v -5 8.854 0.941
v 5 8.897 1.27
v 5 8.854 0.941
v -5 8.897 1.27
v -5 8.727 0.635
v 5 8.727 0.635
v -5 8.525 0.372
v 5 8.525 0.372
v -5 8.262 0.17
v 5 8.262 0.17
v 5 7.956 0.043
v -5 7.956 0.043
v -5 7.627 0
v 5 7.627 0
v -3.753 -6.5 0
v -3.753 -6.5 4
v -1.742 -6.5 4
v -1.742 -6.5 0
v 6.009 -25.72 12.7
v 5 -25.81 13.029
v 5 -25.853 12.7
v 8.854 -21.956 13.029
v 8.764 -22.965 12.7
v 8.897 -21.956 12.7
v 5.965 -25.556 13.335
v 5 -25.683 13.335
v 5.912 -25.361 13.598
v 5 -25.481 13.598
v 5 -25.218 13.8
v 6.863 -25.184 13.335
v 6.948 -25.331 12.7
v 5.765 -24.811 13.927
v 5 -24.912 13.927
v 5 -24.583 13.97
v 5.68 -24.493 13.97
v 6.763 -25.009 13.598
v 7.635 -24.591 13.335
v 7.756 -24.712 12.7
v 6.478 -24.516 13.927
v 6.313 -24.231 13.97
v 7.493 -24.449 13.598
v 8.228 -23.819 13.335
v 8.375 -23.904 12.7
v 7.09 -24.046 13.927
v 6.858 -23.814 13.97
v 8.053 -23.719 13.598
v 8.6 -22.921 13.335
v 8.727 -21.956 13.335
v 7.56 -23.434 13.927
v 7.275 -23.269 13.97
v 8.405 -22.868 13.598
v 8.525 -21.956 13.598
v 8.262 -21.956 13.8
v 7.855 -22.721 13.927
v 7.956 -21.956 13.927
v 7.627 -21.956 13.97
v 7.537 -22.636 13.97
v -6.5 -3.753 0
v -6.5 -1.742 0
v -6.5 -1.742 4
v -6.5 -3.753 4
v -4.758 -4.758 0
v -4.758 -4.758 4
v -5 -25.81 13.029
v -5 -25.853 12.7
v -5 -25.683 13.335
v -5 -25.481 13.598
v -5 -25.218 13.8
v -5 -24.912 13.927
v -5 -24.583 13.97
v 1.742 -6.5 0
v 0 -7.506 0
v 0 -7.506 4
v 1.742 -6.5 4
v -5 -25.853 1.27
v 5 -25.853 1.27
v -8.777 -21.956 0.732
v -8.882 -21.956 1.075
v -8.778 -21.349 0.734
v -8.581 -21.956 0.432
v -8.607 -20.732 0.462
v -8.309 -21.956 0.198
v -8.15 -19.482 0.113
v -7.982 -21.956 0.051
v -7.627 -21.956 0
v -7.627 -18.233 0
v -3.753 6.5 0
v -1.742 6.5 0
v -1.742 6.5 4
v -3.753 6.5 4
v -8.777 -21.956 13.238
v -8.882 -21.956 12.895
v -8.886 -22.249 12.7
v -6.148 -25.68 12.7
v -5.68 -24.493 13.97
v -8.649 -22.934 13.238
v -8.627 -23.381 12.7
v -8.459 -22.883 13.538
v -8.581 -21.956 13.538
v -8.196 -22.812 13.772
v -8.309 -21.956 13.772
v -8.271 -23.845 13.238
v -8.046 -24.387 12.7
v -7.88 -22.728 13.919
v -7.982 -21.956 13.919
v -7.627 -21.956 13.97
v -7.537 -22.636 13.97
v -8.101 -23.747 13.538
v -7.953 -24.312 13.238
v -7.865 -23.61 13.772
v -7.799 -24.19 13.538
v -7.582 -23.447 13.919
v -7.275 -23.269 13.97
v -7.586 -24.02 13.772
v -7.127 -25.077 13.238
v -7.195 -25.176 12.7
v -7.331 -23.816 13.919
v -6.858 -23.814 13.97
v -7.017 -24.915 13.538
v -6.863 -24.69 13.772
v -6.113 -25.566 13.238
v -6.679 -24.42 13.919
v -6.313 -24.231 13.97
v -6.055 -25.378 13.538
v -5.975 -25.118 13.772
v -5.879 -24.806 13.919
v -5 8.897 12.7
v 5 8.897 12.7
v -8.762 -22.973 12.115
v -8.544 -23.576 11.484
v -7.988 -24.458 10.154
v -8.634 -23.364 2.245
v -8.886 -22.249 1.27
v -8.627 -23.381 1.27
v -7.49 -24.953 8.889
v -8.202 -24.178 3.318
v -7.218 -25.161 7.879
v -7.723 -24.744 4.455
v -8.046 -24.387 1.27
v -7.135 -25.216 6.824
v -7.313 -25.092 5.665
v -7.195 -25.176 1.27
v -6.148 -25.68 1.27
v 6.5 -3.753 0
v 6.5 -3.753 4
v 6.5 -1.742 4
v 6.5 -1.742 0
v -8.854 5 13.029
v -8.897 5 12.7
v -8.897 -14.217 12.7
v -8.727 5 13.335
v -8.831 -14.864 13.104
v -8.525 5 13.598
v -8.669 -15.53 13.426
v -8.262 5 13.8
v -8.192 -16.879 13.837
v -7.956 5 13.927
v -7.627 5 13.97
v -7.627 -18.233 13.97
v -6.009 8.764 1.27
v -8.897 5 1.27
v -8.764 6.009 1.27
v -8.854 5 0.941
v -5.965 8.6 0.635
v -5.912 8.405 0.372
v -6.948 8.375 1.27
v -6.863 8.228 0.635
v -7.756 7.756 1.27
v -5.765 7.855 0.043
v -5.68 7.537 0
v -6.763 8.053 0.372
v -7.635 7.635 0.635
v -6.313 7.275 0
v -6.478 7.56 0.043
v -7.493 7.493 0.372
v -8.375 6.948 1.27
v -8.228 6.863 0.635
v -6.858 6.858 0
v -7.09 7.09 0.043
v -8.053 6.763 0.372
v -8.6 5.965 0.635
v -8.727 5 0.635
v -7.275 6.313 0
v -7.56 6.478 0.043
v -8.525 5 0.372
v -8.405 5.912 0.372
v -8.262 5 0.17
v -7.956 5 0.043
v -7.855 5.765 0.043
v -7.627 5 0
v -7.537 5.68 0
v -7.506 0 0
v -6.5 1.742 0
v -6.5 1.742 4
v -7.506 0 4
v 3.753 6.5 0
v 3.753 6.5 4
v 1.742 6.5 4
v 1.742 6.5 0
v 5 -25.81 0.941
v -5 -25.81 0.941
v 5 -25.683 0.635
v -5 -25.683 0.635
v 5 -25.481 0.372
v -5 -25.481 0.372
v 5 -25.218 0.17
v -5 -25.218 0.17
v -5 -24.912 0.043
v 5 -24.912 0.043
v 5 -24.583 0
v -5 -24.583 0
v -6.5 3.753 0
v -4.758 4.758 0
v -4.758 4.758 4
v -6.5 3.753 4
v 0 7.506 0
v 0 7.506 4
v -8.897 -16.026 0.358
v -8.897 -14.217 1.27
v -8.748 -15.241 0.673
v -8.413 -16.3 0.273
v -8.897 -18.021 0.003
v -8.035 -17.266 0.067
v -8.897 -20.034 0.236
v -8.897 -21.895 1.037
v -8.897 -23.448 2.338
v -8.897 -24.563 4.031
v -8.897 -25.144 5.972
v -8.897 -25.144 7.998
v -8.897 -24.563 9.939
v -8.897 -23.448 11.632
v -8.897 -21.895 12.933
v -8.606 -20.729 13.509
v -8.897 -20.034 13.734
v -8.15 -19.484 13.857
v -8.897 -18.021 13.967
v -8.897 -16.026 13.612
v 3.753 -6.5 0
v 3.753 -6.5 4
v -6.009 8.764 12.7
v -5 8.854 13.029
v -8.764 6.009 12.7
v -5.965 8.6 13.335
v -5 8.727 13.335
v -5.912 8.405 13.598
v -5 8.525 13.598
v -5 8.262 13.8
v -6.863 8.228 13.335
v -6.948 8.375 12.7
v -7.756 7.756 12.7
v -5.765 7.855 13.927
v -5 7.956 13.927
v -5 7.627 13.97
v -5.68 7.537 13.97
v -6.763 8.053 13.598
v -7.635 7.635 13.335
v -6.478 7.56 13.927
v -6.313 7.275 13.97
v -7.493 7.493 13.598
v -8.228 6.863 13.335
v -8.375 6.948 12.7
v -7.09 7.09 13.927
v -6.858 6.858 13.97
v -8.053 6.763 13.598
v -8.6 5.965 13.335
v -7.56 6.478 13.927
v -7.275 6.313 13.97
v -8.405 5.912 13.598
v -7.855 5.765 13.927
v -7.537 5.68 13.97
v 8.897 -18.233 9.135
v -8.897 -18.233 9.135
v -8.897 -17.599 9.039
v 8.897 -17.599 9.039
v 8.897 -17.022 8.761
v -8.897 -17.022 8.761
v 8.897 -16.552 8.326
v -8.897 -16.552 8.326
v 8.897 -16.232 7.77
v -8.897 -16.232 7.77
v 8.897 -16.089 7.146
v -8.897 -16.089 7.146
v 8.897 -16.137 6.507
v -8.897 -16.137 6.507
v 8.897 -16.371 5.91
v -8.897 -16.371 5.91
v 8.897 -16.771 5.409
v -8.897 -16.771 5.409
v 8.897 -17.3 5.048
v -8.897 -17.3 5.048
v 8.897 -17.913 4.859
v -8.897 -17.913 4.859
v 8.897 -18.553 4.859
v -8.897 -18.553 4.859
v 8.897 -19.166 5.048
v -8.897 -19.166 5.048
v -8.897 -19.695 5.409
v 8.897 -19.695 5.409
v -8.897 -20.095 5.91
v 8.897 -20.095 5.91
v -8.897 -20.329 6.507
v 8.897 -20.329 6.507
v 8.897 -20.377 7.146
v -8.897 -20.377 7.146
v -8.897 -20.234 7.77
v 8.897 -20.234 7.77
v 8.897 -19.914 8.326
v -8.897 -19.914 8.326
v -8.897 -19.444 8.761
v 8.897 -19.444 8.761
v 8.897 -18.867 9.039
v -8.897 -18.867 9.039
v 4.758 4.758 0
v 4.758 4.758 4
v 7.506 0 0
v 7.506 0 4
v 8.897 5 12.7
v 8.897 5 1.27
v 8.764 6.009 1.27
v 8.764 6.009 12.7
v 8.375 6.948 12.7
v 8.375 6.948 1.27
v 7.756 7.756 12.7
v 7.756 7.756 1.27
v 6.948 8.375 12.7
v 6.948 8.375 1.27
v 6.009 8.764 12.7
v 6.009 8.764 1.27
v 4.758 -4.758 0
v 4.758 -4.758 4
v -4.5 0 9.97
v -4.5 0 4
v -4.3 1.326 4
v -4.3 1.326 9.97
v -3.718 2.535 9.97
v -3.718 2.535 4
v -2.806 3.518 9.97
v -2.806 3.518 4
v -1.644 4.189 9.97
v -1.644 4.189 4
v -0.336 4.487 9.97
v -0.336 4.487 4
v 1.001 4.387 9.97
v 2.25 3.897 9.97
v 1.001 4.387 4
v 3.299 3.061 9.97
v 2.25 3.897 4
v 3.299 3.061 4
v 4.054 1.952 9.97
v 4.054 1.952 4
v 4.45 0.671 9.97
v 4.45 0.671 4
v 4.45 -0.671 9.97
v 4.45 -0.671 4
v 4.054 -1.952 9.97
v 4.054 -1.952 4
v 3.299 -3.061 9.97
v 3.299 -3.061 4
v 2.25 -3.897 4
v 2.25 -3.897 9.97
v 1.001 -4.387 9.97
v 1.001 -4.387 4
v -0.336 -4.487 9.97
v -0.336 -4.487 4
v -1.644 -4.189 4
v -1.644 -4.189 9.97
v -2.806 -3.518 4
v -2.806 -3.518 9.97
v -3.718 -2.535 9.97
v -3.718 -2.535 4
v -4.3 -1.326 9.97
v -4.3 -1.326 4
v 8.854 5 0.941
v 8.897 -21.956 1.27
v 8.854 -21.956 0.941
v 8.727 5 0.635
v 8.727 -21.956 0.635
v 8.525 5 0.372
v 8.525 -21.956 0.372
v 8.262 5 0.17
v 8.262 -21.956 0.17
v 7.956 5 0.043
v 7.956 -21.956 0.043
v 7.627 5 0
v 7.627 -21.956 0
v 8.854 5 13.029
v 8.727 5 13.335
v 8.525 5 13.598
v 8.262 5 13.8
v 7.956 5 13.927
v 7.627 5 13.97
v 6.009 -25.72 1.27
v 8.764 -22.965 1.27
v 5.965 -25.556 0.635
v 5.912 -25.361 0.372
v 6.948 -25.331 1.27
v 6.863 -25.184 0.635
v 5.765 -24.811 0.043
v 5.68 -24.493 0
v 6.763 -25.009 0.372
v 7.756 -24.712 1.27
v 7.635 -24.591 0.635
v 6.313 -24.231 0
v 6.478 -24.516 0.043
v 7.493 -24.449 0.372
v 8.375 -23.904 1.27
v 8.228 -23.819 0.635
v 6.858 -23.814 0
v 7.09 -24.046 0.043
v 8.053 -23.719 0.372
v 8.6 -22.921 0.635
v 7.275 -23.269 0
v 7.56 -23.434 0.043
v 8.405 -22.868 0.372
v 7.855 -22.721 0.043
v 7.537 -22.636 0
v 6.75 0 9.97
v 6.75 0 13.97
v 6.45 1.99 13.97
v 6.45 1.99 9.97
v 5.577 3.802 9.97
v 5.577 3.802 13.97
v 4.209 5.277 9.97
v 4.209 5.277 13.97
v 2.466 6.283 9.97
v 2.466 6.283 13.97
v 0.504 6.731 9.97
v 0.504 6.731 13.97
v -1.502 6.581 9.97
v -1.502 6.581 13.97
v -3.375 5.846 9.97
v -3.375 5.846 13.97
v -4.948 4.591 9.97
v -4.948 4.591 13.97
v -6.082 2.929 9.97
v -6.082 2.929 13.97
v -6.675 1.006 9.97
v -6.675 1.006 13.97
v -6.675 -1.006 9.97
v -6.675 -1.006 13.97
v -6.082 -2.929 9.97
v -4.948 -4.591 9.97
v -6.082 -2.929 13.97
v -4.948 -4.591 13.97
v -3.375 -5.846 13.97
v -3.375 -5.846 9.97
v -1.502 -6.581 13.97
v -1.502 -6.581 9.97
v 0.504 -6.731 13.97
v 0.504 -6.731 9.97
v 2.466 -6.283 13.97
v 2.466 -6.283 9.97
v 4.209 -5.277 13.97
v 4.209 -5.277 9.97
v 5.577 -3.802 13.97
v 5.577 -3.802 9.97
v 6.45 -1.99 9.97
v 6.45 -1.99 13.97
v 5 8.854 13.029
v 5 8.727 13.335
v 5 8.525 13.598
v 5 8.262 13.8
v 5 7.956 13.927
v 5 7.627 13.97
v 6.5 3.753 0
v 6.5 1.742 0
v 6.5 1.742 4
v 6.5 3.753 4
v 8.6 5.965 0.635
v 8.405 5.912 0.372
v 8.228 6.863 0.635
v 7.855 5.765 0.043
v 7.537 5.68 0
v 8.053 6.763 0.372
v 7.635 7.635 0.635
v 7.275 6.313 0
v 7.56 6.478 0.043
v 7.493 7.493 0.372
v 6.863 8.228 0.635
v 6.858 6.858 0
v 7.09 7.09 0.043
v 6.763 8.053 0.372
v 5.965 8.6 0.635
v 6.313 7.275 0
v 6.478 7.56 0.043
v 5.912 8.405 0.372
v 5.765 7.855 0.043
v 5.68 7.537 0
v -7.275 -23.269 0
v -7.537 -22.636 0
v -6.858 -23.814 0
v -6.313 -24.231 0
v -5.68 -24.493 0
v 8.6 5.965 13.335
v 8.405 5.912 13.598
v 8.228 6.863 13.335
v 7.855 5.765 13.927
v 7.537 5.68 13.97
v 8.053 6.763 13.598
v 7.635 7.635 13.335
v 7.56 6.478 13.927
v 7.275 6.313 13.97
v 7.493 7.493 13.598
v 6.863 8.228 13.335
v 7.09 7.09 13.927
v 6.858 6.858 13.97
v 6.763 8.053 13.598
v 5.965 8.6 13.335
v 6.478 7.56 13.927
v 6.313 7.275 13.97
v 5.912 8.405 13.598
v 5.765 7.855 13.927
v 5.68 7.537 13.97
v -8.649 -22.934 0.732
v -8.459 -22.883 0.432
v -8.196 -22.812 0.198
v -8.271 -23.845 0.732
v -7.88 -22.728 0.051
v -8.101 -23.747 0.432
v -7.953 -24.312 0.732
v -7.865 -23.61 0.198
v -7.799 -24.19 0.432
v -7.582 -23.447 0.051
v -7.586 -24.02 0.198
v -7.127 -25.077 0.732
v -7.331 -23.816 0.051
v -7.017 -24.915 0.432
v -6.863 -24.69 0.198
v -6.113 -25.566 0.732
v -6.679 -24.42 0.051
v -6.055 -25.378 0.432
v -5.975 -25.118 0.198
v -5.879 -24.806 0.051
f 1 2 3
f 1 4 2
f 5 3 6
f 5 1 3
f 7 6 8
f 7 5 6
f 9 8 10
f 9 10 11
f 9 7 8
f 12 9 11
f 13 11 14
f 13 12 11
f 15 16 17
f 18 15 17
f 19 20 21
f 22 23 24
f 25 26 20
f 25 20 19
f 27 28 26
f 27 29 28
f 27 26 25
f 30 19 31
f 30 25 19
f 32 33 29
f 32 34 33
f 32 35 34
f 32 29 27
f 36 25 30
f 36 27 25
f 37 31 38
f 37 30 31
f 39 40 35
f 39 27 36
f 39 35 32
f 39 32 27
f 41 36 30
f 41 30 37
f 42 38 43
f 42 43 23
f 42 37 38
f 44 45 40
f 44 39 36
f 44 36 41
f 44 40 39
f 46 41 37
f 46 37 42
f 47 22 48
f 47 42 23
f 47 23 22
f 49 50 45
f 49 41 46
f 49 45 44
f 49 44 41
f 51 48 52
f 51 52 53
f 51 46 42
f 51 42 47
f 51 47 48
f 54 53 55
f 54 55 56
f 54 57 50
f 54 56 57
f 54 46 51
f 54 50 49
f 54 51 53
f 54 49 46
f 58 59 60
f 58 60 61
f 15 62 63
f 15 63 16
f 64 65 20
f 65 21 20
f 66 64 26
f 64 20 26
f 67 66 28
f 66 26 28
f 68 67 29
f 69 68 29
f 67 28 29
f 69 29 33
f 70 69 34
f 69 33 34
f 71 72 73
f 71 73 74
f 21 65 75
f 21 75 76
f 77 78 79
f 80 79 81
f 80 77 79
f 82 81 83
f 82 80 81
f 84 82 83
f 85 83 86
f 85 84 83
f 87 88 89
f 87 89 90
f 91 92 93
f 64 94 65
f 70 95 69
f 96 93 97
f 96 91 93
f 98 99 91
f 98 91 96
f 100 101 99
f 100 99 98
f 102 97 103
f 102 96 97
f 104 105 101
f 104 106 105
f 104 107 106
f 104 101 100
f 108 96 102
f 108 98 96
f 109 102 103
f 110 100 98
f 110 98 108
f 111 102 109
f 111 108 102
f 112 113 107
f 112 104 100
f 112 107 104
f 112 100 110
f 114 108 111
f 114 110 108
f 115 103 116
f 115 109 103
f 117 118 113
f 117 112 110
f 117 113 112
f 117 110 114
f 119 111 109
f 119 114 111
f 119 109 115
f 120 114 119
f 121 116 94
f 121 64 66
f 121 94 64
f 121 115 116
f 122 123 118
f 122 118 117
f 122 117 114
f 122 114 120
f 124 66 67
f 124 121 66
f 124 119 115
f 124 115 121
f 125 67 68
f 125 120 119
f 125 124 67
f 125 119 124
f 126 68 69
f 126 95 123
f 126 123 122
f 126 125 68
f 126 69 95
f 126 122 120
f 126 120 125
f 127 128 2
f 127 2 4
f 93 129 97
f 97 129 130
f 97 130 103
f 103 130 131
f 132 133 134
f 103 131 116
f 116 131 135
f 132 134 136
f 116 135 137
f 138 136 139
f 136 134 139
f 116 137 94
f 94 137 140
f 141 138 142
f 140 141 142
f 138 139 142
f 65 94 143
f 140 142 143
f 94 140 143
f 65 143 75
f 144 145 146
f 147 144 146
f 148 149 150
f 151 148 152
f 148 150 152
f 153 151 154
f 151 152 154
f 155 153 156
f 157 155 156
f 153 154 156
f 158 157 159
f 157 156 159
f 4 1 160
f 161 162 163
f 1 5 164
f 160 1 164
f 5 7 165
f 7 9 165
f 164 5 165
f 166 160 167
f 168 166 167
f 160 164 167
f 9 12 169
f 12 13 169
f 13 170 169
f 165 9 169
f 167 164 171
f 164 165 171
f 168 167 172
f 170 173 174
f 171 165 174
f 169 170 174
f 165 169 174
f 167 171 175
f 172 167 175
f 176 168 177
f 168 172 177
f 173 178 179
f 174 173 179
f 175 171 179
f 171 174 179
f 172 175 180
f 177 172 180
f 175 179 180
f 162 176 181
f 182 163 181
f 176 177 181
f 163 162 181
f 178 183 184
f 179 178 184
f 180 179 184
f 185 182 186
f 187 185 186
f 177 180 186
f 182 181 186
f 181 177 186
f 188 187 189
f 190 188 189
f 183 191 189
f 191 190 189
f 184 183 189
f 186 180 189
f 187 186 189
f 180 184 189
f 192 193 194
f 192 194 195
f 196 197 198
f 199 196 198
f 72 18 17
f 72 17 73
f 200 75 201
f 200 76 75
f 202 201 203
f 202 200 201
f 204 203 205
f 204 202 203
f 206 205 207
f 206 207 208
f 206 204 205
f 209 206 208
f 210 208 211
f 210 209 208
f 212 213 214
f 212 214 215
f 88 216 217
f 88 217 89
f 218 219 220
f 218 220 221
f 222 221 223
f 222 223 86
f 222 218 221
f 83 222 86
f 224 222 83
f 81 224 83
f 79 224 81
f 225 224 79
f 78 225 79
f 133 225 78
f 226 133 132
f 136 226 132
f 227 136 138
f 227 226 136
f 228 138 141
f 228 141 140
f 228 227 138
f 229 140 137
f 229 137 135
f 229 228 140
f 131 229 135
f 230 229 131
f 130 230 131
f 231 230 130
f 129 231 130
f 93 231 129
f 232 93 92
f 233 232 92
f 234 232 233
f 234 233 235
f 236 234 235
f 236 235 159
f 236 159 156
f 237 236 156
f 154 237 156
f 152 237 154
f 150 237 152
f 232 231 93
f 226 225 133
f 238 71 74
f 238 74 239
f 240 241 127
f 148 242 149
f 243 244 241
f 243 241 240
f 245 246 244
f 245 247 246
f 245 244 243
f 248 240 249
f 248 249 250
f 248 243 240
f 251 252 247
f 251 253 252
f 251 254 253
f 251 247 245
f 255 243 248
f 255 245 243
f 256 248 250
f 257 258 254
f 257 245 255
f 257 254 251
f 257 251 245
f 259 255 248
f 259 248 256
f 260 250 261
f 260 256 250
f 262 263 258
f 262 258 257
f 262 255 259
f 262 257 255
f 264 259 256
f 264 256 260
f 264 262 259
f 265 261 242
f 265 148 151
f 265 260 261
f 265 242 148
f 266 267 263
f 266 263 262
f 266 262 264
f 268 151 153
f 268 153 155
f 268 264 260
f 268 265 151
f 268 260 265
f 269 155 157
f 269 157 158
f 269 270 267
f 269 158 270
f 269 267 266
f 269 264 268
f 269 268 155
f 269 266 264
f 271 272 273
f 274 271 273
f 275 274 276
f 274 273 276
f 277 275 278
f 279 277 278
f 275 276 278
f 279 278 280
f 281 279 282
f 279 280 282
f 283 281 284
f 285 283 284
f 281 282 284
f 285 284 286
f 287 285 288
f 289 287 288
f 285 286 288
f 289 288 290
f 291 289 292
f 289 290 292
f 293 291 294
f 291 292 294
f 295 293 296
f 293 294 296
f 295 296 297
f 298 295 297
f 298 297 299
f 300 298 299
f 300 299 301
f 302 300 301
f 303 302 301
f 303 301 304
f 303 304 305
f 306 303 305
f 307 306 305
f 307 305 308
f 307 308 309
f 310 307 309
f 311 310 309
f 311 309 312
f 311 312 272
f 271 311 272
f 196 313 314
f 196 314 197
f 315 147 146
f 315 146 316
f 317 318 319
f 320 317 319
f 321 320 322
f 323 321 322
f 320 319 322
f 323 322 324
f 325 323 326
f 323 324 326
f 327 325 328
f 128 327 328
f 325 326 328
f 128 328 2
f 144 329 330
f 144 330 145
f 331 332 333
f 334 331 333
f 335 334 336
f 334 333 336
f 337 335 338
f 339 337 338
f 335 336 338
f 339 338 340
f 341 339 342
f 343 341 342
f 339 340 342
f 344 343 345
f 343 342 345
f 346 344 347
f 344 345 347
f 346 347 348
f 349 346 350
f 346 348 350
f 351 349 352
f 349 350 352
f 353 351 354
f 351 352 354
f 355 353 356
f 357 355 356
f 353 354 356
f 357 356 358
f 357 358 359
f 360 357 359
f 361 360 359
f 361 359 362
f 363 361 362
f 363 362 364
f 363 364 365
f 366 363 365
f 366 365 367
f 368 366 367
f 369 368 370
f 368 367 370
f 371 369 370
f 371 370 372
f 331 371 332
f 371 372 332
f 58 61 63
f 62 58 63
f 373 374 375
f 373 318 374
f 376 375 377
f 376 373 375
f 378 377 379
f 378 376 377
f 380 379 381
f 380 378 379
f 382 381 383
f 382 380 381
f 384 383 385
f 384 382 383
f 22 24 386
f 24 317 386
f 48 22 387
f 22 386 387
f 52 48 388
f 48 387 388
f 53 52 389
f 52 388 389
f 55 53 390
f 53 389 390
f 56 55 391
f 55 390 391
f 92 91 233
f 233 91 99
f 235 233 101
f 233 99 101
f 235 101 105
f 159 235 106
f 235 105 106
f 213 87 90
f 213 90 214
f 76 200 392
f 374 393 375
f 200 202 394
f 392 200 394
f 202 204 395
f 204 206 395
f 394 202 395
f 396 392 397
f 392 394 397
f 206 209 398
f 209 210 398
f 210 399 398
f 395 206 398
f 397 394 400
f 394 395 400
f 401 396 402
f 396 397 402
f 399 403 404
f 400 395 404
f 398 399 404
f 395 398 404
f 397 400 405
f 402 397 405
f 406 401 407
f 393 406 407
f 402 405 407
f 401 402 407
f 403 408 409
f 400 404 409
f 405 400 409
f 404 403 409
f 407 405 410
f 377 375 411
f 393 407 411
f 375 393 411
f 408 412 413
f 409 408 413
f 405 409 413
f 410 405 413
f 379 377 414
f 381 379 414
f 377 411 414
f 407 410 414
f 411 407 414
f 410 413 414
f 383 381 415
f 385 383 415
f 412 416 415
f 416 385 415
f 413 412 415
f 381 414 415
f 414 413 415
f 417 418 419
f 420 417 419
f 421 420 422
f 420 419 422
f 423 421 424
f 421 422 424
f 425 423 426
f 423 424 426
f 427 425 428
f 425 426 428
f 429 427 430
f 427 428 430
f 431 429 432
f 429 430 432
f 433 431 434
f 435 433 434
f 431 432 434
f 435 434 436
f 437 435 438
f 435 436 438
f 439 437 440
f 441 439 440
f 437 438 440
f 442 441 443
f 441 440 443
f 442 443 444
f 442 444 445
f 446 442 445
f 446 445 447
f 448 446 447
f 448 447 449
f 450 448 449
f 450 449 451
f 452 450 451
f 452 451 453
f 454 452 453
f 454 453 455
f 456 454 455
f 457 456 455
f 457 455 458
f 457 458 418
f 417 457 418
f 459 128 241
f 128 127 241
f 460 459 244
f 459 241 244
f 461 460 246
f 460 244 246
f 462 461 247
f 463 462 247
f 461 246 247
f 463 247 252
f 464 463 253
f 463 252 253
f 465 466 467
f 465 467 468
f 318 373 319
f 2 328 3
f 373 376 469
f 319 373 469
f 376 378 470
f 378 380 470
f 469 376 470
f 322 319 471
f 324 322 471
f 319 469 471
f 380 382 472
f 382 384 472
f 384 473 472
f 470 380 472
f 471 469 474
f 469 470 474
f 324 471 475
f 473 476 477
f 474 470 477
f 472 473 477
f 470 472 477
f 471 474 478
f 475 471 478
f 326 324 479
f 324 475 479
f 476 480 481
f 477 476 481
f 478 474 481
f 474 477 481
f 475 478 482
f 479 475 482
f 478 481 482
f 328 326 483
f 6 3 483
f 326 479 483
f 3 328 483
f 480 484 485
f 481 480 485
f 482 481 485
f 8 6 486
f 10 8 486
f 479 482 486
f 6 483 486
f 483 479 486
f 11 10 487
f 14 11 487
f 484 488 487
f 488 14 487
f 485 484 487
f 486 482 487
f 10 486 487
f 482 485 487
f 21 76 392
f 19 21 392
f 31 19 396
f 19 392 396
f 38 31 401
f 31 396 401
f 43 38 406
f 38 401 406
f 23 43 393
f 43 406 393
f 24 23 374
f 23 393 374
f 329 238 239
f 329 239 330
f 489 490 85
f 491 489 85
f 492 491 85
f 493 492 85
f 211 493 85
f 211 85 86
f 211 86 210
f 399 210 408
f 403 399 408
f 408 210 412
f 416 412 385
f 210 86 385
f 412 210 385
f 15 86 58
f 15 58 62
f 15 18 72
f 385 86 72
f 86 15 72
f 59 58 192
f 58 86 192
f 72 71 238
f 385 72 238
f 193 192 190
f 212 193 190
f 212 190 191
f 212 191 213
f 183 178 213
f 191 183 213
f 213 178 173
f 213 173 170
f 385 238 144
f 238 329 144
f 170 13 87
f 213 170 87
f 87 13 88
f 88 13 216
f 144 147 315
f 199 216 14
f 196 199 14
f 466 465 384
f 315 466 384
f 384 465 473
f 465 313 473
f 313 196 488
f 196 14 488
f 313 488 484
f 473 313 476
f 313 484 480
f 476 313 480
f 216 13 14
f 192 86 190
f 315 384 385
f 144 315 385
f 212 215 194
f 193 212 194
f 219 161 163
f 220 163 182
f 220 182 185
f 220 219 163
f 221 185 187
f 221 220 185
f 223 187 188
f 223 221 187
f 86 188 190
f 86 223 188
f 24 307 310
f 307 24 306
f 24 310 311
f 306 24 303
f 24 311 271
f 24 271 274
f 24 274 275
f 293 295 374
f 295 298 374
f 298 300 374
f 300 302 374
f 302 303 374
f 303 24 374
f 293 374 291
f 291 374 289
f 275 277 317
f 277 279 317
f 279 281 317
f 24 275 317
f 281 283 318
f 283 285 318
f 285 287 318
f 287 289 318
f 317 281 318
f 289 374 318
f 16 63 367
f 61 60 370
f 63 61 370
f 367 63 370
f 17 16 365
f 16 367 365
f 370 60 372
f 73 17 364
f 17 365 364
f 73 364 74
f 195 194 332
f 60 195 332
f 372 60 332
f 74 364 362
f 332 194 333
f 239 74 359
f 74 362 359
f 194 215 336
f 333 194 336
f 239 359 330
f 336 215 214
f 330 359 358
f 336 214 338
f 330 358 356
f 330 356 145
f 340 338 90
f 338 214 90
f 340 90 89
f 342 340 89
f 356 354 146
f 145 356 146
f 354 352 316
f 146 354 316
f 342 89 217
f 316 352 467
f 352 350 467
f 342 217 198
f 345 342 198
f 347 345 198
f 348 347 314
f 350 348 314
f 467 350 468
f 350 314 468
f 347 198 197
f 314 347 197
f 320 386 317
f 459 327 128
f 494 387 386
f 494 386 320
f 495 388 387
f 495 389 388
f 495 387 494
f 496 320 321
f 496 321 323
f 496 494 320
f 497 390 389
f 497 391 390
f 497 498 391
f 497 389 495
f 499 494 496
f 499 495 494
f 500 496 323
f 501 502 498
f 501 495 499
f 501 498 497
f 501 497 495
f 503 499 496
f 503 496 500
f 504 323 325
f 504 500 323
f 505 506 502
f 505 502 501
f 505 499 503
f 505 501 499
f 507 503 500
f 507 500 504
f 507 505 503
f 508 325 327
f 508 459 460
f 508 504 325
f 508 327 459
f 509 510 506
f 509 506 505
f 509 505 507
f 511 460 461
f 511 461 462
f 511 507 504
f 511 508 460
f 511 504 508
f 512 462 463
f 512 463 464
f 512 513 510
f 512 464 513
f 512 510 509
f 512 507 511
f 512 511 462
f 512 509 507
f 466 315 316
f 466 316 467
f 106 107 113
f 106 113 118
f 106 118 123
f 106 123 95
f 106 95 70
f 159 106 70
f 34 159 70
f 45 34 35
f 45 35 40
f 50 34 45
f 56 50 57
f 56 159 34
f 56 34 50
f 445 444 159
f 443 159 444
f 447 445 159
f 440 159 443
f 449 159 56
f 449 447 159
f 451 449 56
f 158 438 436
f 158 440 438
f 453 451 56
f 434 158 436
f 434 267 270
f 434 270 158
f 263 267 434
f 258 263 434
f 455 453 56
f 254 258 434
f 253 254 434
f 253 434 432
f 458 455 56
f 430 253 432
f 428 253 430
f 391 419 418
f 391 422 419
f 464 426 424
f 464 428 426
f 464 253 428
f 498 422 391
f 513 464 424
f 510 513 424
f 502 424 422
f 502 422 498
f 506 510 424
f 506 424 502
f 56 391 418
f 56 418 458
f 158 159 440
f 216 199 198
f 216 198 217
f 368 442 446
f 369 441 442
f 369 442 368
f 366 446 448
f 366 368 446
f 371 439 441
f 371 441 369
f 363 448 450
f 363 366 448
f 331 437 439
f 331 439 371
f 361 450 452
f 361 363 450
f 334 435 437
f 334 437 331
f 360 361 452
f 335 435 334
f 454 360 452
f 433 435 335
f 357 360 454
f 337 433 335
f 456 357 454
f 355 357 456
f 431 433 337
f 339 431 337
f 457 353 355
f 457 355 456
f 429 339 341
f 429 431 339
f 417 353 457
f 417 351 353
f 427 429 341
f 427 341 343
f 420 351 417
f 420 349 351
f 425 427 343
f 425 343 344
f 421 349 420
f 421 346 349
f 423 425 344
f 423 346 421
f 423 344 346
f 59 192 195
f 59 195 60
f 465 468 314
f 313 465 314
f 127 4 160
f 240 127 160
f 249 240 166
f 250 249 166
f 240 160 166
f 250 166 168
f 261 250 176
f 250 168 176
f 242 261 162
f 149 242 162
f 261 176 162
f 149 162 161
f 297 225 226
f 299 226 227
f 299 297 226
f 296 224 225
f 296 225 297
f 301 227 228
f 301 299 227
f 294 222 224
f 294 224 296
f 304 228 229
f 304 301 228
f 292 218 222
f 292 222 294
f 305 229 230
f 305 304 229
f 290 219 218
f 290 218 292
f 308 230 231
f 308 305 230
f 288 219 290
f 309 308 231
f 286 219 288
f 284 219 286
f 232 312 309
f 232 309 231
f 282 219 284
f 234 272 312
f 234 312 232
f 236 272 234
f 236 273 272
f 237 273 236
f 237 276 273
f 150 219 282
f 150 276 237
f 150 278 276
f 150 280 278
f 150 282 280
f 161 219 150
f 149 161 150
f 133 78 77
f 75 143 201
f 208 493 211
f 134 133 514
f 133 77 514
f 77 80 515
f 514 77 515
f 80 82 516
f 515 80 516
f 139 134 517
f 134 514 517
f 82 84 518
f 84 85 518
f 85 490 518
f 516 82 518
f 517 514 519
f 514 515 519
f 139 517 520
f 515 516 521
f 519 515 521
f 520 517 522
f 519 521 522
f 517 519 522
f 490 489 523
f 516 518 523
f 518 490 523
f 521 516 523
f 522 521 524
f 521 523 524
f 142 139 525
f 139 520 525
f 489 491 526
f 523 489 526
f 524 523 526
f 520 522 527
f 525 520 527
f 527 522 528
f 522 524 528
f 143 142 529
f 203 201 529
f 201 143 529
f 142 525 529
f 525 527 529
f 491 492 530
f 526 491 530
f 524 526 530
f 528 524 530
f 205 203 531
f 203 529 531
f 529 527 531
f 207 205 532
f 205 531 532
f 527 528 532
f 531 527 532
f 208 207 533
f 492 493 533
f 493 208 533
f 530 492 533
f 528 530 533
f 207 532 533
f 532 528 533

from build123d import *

# Parameters (mm, degrees)
BOSS_EXTRUDE1_DEPTH            = 13.97
FILLET1_R                      = 1.27
CBORE_FOR_M8_SHCS1_D           = 9
CBORE_FOR_M8_SHCS1_CBORE_D     = 13.5
CBORE_FOR_M8_SHCS1_CBORE_DEPTH = 4
M4_CLEARANCE_HOLE1_D           = 4.3
SKETCH6_R                      = 4.5
CUT_EXTRUDE1_DEPTH             = 4
BOSS_EXTRUDE3_REACH            = 19.794
SKETCH9_R                      = 6.985
SKETCH9_R_2                    = 2.15


with BuildPart() as part:
    # Sketch1 → Boss-Extrude1 (new body)
    with BuildSketch(Plane.XY):
        with BuildLine():
            Line((-8.897, -5), (-8.897, -21.956))
            ThreePointArc((-8.897, -21.956), (-7.755595126, -24.711595126), (-5, -25.853))
            Line((-5, -25.853), (5, -25.853))
            ThreePointArc((5, -25.853), (7.755595126, -24.711595126), (8.897, -21.956))
            Line((8.897, -21.956), (8.897, -5))
            Line((8.897, -5), (8.897, 5))
            ThreePointArc((8.897, 5), (7.755595126, 7.755595126), (5, 8.897))
            Line((5, 8.897), (-5, 8.897))
            ThreePointArc((-5, 8.897), (-7.755595126, 7.755595126), (-8.897, 5))
            Line((-8.897, 5), (-8.897, -5))
        make_face()
    extrude(amount=BOSS_EXTRUDE1_DEPTH)

    # Fillet1
    fillet1_edges = [part.edges().sort_by_distance(p)[0] for p in [
        (-7.755595126, -24.711595126, 13.97),
        (7.755595126, 7.755595126, 0),
        (8.897, -8.478, 0),
        (7.755595126, -24.711595126, 0),
        (0, -25.853, 0),
        (-7.755595126, -24.711595126, 0),
        (-8.897, -8.478, 0),
        (0, -25.853, 13.97),
        (7.755595126, -24.711595126, 13.97),
        (8.897, -8.478, 13.97),
        (7.755595126, 7.755595126, 13.97),
        (0, 8.897, 13.97),
        (-7.755595126, 7.755595126, 13.97),
        (-8.897, -8.478, 13.97),
        (-7.755595126, 7.755595126, 0),
        (0, 8.897, 0),
    ]]
    fillet(fillet1_edges, radius=FILLET1_R)

    # CBORE for M8 SHCS1 (through all)
    with Locations(Plane.XY.offset(13.97)):
        with Locations((0, 0)):
            CounterBoreHole(CBORE_FOR_M8_SHCS1_D / 2, CBORE_FOR_M8_SHCS1_CBORE_D / 2, CBORE_FOR_M8_SHCS1_CBORE_DEPTH)

    # M4 Clearance Hole1 (through all)
    with Locations(Plane(origin=(8.897, 0, 0), x_dir=(0, 0, -1), z_dir=(1, 0, 0))):
        with Locations((-6.985, -18.233)):
            Hole(M4_CLEARANCE_HOLE1_D / 2)

    # Sketch6 → Cut-Extrude1 (cut)
    with BuildSketch(Plane.XY):
        Circle(SKETCH6_R)
        Polygon((-3.75277675, 6.5), (-7.505553499, 0), (-3.75277675, -6.5), (3.75277675, -6.5), (7.505553499, 0), (3.75277675, 6.5), align=None)
        Polygon((-3.25, 5.629165125), (-6.5, 3.75277675), (-6.5, 0), (-6.5, -3.75277675), (-3.25, -5.629165125), (0, -7.505553499), (3.25, -5.629165125), (6.5, -3.75277675), (6.5, 0), (6.5, 3.75277675), (3.25, 5.629165125), (0, 7.505553499), align=None)
        Polygon((6.5, 3.75277675), (4.758330249, 4.758330249), (6.5, 1.741669751), align=None)
        Polygon((6.5, -3.75277675), (6.5, -1.741669751), (4.758330249, -4.758330249), align=None)
        Polygon((3.75277675, -6.5), (4.758330249, -4.758330249), (3.25, -5.629165125), (1.741669751, -6.5), align=None)
        Polygon((1.741669751, 6.5), (3.25, 5.629165125), (4.758330249, 4.758330249), (3.75277675, 6.5), align=None)
        Polygon((-6.5, 1.741669751), (-4.758330249, 4.758330249), (-6.5, 3.75277675), align=None)
        Polygon((-4.758330249, -4.758330249), (-6.5, -1.741669751), (-6.5, -3.75277675), align=None)
        Polygon((-3.25, -5.629165125), (-4.758330249, -4.758330249), (-3.75277675, -6.5), (-1.741669751, -6.5), align=None)
        Polygon((0, -7.505553499), (1.741669751, -6.5), (-1.741669751, -6.5), align=None)
        Polygon((-3.25, 5.629165125), (-1.741669751, 6.5), (-3.75277675, 6.5), (-4.758330249, 4.758330249), align=None)
        Polygon((7.505553499, 0), (6.5, 1.741669751), (6.5, 0), (6.5, -1.741669751), align=None)
        Polygon((-1.741669751, 6.5), (1.741669751, 6.5), (0, 7.505553499), align=None)
        Polygon((-6.5, 0), (-6.5, 1.741669751), (-7.505553499, 0), (-6.5, -1.741669751), align=None)
    extrude(amount=CUT_EXTRUDE1_DEPTH, mode=Mode.SUBTRACT)

    # Sketch9 → Boss-Extrude3 (add, up to next)
    with BuildSketch(Plane.ZY.offset(8.897), mode=Mode.PRIVATE) as boss_extrude3_sk1:
        with Locations((6.985, -18.233)):
            Circle(SKETCH9_R)
        with Locations((6.985, -18.233)):
            Circle(SKETCH9_R_2, mode=Mode.SUBTRACT)
    boss_extrude3_tool1 = extrude(boss_extrude3_sk1.sketch, amount=-BOSS_EXTRUDE3_REACH, mode=Mode.PRIVATE) - part.part
    add(boss_extrude3_tool1.solids().sort_by_distance((-8.897, -18.233, 0.197566))[0])


solid = part.part
